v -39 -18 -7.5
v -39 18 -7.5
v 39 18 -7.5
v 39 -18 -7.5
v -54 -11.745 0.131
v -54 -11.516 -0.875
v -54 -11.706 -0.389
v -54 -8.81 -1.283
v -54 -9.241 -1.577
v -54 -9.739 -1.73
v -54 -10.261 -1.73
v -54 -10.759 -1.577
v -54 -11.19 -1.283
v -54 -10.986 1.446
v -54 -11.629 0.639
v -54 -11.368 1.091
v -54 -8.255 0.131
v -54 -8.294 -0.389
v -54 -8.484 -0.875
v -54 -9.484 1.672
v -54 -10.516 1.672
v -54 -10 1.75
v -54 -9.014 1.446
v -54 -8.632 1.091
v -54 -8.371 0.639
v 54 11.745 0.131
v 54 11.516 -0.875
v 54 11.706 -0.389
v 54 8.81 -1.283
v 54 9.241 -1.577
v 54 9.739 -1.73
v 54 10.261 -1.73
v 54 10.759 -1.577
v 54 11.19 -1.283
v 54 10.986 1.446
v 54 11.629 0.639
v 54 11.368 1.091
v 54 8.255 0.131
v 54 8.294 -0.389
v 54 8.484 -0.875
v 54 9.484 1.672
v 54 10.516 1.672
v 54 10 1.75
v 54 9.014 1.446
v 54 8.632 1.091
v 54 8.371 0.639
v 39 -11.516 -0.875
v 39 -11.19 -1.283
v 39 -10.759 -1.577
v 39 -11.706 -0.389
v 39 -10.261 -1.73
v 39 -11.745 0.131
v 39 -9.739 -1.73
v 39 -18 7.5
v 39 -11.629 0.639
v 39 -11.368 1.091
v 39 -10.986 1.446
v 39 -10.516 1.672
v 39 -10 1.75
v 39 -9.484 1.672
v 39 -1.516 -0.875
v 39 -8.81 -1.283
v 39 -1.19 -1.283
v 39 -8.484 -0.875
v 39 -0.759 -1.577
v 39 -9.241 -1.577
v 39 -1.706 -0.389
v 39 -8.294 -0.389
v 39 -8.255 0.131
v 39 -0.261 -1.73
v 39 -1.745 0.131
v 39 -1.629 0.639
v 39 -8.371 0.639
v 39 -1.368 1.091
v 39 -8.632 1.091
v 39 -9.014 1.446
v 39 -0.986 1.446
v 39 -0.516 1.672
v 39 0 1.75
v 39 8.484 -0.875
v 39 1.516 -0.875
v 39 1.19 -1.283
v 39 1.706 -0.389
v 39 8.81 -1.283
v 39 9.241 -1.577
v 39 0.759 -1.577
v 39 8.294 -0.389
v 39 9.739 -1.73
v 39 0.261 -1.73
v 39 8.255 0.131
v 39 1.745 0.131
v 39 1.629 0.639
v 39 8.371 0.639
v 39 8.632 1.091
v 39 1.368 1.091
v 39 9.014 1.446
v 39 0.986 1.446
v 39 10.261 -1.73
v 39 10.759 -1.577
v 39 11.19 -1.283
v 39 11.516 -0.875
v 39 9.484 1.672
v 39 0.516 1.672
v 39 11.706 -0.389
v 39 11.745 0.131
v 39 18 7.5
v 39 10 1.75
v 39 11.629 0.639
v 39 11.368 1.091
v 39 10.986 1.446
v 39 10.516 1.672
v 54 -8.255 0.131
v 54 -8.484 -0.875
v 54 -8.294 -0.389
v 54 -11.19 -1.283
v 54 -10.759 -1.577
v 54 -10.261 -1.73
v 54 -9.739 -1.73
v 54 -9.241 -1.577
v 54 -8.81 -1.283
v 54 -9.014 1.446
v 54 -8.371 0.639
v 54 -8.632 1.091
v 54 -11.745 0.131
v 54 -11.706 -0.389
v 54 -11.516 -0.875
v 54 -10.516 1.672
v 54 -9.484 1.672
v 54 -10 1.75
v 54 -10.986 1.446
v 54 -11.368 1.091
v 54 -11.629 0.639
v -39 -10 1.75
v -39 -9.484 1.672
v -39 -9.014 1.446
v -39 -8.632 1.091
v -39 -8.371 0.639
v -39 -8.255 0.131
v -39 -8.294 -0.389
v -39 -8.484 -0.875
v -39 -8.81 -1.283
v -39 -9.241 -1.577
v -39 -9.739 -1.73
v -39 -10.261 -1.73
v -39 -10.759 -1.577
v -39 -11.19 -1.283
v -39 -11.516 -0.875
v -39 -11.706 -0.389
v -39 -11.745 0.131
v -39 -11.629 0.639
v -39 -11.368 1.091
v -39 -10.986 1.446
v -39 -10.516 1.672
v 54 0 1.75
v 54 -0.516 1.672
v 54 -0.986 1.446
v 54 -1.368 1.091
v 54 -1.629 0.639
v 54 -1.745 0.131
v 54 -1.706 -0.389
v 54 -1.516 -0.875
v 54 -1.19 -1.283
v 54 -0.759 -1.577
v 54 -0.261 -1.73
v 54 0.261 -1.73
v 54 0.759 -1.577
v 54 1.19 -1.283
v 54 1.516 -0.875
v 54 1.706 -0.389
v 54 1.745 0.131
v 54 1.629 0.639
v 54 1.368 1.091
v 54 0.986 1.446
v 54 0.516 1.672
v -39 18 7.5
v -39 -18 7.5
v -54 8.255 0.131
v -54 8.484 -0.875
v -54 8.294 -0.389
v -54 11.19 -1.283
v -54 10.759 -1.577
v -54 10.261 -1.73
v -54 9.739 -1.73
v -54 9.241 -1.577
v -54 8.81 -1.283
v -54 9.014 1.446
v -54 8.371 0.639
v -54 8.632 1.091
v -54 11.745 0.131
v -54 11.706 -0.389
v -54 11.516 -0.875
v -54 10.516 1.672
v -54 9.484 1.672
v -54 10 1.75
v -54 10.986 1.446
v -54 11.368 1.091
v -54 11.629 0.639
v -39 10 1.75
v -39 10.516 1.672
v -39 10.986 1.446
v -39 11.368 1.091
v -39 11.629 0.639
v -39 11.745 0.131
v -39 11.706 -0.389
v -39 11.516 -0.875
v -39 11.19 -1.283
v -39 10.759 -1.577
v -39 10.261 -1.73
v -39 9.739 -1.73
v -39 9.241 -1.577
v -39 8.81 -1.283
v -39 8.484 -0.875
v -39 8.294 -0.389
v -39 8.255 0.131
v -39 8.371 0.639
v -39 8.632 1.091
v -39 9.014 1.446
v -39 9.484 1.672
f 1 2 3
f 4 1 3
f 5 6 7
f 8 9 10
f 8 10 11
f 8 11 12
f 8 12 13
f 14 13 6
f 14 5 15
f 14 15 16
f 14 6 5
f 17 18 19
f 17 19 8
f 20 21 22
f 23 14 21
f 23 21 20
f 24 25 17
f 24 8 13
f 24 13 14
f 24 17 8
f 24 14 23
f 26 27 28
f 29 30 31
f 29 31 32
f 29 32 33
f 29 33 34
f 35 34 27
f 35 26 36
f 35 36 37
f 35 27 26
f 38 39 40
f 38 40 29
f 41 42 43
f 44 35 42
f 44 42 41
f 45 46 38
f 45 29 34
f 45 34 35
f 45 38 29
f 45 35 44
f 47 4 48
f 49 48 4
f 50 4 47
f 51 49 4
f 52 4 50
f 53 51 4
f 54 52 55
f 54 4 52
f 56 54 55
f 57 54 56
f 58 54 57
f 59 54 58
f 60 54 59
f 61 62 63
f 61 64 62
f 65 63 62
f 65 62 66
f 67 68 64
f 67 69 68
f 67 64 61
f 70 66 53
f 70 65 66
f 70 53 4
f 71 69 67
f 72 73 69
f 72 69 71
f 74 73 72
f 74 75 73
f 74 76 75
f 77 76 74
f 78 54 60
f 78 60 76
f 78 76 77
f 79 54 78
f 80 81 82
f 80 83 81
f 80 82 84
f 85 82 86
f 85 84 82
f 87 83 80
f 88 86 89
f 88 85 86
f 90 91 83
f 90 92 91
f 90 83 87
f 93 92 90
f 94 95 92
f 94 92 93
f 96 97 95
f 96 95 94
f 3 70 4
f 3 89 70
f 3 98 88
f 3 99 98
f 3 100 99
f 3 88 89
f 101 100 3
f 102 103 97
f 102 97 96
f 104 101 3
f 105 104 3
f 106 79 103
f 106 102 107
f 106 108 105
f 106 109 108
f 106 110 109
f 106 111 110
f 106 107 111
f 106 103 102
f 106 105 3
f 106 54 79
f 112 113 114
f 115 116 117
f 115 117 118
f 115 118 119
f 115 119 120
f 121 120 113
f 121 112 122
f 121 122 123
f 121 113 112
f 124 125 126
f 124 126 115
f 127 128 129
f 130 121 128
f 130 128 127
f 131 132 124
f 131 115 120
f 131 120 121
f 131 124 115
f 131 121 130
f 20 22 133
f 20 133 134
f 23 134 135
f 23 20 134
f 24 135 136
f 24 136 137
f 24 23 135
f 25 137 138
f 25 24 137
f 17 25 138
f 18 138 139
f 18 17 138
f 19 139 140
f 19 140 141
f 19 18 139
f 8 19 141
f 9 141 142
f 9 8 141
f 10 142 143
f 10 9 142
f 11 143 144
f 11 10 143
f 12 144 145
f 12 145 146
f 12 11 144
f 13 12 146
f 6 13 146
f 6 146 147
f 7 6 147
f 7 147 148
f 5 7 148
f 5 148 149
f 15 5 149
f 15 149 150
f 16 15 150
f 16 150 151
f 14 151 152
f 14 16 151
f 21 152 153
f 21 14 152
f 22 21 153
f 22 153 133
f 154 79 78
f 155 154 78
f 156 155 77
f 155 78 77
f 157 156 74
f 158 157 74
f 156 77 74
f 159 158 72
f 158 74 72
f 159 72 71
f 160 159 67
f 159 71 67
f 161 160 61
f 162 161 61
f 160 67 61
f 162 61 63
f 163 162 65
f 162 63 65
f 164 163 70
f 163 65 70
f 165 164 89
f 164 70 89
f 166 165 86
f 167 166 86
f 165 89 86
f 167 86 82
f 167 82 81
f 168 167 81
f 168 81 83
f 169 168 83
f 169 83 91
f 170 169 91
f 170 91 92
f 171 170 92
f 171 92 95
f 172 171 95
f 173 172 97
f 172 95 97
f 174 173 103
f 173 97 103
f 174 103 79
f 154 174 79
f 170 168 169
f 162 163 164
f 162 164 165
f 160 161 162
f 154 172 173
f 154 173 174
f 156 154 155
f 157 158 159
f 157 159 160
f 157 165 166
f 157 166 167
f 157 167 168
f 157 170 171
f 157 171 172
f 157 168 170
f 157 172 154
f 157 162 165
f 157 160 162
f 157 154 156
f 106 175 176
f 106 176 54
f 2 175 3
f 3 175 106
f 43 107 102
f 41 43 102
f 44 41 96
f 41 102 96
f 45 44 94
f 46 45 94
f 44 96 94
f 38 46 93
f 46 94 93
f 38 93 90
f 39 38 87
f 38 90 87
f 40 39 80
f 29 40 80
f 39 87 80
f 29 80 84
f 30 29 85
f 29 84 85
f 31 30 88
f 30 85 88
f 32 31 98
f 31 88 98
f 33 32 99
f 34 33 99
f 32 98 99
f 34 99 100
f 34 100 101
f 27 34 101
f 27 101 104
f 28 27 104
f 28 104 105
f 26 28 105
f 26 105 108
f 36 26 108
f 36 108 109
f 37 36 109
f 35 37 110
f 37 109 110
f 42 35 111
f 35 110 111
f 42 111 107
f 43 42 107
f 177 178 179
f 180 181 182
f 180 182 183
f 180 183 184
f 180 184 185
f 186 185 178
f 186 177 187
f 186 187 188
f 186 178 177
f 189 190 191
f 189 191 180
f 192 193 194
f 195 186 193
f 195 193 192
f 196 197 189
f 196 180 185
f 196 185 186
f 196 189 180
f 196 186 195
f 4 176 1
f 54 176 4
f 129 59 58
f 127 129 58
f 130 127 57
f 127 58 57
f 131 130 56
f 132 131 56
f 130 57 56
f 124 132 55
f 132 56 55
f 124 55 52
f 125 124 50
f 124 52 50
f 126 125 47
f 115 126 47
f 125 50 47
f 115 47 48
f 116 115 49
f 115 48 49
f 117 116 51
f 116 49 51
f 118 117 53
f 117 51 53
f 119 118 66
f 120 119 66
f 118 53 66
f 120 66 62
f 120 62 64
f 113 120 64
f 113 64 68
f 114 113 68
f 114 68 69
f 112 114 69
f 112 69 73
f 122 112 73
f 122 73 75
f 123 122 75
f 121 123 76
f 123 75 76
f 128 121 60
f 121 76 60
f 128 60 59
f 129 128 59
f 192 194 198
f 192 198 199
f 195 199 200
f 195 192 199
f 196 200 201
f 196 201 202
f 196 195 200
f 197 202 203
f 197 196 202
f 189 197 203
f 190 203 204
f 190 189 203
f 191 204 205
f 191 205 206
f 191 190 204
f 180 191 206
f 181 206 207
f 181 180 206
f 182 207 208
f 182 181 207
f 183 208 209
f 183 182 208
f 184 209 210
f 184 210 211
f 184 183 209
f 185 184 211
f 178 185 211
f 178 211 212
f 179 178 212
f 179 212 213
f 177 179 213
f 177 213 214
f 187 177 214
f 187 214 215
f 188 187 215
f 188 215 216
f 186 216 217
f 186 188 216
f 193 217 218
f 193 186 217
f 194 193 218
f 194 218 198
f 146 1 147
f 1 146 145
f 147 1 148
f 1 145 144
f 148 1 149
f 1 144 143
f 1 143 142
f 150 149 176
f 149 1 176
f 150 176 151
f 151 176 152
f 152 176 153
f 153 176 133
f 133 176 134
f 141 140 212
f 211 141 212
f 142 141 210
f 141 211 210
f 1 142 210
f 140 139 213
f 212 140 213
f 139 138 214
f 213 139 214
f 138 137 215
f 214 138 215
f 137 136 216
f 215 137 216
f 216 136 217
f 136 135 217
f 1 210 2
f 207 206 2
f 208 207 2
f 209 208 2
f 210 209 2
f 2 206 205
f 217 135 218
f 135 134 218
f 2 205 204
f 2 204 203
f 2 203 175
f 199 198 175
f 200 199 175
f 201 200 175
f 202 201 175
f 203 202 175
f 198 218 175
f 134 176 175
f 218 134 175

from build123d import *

# Parameters (mm, degrees)
SKETCH_2_W      = 78
SKETCH_2_H      = 36
EXTRUDE_1_DEPTH = 7.5
SKETCH_3_R      = 1.75
EXTRUDE_2_DEPTH = 15
EXTRUDE_START   = 15
SKETCH_4_R      = 1.75
EXTRUDE_3_DEPTH = 15


with BuildPart() as part:
    # Эскиз2 → Бобышка-Вытянуть1 (new, symmetric)
    with BuildSketch(Plane.XY):
        Rectangle(SKETCH_2_W, SKETCH_2_H)
    extrude(amount=EXTRUDE_1_DEPTH, both=True)

    # Эскиз3 → Бобышка-Вытянуть2 (add)
    with BuildSketch(Plane(origin=(39, 0, 0), x_dir=(0, 0, -1), z_dir=(1, 0, 0))):
        with Locations(Location((0, -10, 0), (0, 0, 180))):
            Circle(SKETCH_3_R)
        with Locations(Location((0, 0, 0), (0, 0, 180))):
            Circle(SKETCH_3_R)
        with Locations(Location((0, 10, 0), (0, 0, 180))):
            Circle(SKETCH_3_R)
    extrude(amount=EXTRUDE_2_DEPTH)

    # Эскиз4 → Бобышка-Вытянуть3 (add)
    with BuildSketch(Plane.ZY.offset(39).offset(EXTRUDE_START)):
        with Locations((0, 10)):
            Circle(SKETCH_4_R)
        with Locations((0, -10)):
            Circle(SKETCH_4_R)
    extrude(amount=-EXTRUDE_3_DEPTH)


solid = part.part
